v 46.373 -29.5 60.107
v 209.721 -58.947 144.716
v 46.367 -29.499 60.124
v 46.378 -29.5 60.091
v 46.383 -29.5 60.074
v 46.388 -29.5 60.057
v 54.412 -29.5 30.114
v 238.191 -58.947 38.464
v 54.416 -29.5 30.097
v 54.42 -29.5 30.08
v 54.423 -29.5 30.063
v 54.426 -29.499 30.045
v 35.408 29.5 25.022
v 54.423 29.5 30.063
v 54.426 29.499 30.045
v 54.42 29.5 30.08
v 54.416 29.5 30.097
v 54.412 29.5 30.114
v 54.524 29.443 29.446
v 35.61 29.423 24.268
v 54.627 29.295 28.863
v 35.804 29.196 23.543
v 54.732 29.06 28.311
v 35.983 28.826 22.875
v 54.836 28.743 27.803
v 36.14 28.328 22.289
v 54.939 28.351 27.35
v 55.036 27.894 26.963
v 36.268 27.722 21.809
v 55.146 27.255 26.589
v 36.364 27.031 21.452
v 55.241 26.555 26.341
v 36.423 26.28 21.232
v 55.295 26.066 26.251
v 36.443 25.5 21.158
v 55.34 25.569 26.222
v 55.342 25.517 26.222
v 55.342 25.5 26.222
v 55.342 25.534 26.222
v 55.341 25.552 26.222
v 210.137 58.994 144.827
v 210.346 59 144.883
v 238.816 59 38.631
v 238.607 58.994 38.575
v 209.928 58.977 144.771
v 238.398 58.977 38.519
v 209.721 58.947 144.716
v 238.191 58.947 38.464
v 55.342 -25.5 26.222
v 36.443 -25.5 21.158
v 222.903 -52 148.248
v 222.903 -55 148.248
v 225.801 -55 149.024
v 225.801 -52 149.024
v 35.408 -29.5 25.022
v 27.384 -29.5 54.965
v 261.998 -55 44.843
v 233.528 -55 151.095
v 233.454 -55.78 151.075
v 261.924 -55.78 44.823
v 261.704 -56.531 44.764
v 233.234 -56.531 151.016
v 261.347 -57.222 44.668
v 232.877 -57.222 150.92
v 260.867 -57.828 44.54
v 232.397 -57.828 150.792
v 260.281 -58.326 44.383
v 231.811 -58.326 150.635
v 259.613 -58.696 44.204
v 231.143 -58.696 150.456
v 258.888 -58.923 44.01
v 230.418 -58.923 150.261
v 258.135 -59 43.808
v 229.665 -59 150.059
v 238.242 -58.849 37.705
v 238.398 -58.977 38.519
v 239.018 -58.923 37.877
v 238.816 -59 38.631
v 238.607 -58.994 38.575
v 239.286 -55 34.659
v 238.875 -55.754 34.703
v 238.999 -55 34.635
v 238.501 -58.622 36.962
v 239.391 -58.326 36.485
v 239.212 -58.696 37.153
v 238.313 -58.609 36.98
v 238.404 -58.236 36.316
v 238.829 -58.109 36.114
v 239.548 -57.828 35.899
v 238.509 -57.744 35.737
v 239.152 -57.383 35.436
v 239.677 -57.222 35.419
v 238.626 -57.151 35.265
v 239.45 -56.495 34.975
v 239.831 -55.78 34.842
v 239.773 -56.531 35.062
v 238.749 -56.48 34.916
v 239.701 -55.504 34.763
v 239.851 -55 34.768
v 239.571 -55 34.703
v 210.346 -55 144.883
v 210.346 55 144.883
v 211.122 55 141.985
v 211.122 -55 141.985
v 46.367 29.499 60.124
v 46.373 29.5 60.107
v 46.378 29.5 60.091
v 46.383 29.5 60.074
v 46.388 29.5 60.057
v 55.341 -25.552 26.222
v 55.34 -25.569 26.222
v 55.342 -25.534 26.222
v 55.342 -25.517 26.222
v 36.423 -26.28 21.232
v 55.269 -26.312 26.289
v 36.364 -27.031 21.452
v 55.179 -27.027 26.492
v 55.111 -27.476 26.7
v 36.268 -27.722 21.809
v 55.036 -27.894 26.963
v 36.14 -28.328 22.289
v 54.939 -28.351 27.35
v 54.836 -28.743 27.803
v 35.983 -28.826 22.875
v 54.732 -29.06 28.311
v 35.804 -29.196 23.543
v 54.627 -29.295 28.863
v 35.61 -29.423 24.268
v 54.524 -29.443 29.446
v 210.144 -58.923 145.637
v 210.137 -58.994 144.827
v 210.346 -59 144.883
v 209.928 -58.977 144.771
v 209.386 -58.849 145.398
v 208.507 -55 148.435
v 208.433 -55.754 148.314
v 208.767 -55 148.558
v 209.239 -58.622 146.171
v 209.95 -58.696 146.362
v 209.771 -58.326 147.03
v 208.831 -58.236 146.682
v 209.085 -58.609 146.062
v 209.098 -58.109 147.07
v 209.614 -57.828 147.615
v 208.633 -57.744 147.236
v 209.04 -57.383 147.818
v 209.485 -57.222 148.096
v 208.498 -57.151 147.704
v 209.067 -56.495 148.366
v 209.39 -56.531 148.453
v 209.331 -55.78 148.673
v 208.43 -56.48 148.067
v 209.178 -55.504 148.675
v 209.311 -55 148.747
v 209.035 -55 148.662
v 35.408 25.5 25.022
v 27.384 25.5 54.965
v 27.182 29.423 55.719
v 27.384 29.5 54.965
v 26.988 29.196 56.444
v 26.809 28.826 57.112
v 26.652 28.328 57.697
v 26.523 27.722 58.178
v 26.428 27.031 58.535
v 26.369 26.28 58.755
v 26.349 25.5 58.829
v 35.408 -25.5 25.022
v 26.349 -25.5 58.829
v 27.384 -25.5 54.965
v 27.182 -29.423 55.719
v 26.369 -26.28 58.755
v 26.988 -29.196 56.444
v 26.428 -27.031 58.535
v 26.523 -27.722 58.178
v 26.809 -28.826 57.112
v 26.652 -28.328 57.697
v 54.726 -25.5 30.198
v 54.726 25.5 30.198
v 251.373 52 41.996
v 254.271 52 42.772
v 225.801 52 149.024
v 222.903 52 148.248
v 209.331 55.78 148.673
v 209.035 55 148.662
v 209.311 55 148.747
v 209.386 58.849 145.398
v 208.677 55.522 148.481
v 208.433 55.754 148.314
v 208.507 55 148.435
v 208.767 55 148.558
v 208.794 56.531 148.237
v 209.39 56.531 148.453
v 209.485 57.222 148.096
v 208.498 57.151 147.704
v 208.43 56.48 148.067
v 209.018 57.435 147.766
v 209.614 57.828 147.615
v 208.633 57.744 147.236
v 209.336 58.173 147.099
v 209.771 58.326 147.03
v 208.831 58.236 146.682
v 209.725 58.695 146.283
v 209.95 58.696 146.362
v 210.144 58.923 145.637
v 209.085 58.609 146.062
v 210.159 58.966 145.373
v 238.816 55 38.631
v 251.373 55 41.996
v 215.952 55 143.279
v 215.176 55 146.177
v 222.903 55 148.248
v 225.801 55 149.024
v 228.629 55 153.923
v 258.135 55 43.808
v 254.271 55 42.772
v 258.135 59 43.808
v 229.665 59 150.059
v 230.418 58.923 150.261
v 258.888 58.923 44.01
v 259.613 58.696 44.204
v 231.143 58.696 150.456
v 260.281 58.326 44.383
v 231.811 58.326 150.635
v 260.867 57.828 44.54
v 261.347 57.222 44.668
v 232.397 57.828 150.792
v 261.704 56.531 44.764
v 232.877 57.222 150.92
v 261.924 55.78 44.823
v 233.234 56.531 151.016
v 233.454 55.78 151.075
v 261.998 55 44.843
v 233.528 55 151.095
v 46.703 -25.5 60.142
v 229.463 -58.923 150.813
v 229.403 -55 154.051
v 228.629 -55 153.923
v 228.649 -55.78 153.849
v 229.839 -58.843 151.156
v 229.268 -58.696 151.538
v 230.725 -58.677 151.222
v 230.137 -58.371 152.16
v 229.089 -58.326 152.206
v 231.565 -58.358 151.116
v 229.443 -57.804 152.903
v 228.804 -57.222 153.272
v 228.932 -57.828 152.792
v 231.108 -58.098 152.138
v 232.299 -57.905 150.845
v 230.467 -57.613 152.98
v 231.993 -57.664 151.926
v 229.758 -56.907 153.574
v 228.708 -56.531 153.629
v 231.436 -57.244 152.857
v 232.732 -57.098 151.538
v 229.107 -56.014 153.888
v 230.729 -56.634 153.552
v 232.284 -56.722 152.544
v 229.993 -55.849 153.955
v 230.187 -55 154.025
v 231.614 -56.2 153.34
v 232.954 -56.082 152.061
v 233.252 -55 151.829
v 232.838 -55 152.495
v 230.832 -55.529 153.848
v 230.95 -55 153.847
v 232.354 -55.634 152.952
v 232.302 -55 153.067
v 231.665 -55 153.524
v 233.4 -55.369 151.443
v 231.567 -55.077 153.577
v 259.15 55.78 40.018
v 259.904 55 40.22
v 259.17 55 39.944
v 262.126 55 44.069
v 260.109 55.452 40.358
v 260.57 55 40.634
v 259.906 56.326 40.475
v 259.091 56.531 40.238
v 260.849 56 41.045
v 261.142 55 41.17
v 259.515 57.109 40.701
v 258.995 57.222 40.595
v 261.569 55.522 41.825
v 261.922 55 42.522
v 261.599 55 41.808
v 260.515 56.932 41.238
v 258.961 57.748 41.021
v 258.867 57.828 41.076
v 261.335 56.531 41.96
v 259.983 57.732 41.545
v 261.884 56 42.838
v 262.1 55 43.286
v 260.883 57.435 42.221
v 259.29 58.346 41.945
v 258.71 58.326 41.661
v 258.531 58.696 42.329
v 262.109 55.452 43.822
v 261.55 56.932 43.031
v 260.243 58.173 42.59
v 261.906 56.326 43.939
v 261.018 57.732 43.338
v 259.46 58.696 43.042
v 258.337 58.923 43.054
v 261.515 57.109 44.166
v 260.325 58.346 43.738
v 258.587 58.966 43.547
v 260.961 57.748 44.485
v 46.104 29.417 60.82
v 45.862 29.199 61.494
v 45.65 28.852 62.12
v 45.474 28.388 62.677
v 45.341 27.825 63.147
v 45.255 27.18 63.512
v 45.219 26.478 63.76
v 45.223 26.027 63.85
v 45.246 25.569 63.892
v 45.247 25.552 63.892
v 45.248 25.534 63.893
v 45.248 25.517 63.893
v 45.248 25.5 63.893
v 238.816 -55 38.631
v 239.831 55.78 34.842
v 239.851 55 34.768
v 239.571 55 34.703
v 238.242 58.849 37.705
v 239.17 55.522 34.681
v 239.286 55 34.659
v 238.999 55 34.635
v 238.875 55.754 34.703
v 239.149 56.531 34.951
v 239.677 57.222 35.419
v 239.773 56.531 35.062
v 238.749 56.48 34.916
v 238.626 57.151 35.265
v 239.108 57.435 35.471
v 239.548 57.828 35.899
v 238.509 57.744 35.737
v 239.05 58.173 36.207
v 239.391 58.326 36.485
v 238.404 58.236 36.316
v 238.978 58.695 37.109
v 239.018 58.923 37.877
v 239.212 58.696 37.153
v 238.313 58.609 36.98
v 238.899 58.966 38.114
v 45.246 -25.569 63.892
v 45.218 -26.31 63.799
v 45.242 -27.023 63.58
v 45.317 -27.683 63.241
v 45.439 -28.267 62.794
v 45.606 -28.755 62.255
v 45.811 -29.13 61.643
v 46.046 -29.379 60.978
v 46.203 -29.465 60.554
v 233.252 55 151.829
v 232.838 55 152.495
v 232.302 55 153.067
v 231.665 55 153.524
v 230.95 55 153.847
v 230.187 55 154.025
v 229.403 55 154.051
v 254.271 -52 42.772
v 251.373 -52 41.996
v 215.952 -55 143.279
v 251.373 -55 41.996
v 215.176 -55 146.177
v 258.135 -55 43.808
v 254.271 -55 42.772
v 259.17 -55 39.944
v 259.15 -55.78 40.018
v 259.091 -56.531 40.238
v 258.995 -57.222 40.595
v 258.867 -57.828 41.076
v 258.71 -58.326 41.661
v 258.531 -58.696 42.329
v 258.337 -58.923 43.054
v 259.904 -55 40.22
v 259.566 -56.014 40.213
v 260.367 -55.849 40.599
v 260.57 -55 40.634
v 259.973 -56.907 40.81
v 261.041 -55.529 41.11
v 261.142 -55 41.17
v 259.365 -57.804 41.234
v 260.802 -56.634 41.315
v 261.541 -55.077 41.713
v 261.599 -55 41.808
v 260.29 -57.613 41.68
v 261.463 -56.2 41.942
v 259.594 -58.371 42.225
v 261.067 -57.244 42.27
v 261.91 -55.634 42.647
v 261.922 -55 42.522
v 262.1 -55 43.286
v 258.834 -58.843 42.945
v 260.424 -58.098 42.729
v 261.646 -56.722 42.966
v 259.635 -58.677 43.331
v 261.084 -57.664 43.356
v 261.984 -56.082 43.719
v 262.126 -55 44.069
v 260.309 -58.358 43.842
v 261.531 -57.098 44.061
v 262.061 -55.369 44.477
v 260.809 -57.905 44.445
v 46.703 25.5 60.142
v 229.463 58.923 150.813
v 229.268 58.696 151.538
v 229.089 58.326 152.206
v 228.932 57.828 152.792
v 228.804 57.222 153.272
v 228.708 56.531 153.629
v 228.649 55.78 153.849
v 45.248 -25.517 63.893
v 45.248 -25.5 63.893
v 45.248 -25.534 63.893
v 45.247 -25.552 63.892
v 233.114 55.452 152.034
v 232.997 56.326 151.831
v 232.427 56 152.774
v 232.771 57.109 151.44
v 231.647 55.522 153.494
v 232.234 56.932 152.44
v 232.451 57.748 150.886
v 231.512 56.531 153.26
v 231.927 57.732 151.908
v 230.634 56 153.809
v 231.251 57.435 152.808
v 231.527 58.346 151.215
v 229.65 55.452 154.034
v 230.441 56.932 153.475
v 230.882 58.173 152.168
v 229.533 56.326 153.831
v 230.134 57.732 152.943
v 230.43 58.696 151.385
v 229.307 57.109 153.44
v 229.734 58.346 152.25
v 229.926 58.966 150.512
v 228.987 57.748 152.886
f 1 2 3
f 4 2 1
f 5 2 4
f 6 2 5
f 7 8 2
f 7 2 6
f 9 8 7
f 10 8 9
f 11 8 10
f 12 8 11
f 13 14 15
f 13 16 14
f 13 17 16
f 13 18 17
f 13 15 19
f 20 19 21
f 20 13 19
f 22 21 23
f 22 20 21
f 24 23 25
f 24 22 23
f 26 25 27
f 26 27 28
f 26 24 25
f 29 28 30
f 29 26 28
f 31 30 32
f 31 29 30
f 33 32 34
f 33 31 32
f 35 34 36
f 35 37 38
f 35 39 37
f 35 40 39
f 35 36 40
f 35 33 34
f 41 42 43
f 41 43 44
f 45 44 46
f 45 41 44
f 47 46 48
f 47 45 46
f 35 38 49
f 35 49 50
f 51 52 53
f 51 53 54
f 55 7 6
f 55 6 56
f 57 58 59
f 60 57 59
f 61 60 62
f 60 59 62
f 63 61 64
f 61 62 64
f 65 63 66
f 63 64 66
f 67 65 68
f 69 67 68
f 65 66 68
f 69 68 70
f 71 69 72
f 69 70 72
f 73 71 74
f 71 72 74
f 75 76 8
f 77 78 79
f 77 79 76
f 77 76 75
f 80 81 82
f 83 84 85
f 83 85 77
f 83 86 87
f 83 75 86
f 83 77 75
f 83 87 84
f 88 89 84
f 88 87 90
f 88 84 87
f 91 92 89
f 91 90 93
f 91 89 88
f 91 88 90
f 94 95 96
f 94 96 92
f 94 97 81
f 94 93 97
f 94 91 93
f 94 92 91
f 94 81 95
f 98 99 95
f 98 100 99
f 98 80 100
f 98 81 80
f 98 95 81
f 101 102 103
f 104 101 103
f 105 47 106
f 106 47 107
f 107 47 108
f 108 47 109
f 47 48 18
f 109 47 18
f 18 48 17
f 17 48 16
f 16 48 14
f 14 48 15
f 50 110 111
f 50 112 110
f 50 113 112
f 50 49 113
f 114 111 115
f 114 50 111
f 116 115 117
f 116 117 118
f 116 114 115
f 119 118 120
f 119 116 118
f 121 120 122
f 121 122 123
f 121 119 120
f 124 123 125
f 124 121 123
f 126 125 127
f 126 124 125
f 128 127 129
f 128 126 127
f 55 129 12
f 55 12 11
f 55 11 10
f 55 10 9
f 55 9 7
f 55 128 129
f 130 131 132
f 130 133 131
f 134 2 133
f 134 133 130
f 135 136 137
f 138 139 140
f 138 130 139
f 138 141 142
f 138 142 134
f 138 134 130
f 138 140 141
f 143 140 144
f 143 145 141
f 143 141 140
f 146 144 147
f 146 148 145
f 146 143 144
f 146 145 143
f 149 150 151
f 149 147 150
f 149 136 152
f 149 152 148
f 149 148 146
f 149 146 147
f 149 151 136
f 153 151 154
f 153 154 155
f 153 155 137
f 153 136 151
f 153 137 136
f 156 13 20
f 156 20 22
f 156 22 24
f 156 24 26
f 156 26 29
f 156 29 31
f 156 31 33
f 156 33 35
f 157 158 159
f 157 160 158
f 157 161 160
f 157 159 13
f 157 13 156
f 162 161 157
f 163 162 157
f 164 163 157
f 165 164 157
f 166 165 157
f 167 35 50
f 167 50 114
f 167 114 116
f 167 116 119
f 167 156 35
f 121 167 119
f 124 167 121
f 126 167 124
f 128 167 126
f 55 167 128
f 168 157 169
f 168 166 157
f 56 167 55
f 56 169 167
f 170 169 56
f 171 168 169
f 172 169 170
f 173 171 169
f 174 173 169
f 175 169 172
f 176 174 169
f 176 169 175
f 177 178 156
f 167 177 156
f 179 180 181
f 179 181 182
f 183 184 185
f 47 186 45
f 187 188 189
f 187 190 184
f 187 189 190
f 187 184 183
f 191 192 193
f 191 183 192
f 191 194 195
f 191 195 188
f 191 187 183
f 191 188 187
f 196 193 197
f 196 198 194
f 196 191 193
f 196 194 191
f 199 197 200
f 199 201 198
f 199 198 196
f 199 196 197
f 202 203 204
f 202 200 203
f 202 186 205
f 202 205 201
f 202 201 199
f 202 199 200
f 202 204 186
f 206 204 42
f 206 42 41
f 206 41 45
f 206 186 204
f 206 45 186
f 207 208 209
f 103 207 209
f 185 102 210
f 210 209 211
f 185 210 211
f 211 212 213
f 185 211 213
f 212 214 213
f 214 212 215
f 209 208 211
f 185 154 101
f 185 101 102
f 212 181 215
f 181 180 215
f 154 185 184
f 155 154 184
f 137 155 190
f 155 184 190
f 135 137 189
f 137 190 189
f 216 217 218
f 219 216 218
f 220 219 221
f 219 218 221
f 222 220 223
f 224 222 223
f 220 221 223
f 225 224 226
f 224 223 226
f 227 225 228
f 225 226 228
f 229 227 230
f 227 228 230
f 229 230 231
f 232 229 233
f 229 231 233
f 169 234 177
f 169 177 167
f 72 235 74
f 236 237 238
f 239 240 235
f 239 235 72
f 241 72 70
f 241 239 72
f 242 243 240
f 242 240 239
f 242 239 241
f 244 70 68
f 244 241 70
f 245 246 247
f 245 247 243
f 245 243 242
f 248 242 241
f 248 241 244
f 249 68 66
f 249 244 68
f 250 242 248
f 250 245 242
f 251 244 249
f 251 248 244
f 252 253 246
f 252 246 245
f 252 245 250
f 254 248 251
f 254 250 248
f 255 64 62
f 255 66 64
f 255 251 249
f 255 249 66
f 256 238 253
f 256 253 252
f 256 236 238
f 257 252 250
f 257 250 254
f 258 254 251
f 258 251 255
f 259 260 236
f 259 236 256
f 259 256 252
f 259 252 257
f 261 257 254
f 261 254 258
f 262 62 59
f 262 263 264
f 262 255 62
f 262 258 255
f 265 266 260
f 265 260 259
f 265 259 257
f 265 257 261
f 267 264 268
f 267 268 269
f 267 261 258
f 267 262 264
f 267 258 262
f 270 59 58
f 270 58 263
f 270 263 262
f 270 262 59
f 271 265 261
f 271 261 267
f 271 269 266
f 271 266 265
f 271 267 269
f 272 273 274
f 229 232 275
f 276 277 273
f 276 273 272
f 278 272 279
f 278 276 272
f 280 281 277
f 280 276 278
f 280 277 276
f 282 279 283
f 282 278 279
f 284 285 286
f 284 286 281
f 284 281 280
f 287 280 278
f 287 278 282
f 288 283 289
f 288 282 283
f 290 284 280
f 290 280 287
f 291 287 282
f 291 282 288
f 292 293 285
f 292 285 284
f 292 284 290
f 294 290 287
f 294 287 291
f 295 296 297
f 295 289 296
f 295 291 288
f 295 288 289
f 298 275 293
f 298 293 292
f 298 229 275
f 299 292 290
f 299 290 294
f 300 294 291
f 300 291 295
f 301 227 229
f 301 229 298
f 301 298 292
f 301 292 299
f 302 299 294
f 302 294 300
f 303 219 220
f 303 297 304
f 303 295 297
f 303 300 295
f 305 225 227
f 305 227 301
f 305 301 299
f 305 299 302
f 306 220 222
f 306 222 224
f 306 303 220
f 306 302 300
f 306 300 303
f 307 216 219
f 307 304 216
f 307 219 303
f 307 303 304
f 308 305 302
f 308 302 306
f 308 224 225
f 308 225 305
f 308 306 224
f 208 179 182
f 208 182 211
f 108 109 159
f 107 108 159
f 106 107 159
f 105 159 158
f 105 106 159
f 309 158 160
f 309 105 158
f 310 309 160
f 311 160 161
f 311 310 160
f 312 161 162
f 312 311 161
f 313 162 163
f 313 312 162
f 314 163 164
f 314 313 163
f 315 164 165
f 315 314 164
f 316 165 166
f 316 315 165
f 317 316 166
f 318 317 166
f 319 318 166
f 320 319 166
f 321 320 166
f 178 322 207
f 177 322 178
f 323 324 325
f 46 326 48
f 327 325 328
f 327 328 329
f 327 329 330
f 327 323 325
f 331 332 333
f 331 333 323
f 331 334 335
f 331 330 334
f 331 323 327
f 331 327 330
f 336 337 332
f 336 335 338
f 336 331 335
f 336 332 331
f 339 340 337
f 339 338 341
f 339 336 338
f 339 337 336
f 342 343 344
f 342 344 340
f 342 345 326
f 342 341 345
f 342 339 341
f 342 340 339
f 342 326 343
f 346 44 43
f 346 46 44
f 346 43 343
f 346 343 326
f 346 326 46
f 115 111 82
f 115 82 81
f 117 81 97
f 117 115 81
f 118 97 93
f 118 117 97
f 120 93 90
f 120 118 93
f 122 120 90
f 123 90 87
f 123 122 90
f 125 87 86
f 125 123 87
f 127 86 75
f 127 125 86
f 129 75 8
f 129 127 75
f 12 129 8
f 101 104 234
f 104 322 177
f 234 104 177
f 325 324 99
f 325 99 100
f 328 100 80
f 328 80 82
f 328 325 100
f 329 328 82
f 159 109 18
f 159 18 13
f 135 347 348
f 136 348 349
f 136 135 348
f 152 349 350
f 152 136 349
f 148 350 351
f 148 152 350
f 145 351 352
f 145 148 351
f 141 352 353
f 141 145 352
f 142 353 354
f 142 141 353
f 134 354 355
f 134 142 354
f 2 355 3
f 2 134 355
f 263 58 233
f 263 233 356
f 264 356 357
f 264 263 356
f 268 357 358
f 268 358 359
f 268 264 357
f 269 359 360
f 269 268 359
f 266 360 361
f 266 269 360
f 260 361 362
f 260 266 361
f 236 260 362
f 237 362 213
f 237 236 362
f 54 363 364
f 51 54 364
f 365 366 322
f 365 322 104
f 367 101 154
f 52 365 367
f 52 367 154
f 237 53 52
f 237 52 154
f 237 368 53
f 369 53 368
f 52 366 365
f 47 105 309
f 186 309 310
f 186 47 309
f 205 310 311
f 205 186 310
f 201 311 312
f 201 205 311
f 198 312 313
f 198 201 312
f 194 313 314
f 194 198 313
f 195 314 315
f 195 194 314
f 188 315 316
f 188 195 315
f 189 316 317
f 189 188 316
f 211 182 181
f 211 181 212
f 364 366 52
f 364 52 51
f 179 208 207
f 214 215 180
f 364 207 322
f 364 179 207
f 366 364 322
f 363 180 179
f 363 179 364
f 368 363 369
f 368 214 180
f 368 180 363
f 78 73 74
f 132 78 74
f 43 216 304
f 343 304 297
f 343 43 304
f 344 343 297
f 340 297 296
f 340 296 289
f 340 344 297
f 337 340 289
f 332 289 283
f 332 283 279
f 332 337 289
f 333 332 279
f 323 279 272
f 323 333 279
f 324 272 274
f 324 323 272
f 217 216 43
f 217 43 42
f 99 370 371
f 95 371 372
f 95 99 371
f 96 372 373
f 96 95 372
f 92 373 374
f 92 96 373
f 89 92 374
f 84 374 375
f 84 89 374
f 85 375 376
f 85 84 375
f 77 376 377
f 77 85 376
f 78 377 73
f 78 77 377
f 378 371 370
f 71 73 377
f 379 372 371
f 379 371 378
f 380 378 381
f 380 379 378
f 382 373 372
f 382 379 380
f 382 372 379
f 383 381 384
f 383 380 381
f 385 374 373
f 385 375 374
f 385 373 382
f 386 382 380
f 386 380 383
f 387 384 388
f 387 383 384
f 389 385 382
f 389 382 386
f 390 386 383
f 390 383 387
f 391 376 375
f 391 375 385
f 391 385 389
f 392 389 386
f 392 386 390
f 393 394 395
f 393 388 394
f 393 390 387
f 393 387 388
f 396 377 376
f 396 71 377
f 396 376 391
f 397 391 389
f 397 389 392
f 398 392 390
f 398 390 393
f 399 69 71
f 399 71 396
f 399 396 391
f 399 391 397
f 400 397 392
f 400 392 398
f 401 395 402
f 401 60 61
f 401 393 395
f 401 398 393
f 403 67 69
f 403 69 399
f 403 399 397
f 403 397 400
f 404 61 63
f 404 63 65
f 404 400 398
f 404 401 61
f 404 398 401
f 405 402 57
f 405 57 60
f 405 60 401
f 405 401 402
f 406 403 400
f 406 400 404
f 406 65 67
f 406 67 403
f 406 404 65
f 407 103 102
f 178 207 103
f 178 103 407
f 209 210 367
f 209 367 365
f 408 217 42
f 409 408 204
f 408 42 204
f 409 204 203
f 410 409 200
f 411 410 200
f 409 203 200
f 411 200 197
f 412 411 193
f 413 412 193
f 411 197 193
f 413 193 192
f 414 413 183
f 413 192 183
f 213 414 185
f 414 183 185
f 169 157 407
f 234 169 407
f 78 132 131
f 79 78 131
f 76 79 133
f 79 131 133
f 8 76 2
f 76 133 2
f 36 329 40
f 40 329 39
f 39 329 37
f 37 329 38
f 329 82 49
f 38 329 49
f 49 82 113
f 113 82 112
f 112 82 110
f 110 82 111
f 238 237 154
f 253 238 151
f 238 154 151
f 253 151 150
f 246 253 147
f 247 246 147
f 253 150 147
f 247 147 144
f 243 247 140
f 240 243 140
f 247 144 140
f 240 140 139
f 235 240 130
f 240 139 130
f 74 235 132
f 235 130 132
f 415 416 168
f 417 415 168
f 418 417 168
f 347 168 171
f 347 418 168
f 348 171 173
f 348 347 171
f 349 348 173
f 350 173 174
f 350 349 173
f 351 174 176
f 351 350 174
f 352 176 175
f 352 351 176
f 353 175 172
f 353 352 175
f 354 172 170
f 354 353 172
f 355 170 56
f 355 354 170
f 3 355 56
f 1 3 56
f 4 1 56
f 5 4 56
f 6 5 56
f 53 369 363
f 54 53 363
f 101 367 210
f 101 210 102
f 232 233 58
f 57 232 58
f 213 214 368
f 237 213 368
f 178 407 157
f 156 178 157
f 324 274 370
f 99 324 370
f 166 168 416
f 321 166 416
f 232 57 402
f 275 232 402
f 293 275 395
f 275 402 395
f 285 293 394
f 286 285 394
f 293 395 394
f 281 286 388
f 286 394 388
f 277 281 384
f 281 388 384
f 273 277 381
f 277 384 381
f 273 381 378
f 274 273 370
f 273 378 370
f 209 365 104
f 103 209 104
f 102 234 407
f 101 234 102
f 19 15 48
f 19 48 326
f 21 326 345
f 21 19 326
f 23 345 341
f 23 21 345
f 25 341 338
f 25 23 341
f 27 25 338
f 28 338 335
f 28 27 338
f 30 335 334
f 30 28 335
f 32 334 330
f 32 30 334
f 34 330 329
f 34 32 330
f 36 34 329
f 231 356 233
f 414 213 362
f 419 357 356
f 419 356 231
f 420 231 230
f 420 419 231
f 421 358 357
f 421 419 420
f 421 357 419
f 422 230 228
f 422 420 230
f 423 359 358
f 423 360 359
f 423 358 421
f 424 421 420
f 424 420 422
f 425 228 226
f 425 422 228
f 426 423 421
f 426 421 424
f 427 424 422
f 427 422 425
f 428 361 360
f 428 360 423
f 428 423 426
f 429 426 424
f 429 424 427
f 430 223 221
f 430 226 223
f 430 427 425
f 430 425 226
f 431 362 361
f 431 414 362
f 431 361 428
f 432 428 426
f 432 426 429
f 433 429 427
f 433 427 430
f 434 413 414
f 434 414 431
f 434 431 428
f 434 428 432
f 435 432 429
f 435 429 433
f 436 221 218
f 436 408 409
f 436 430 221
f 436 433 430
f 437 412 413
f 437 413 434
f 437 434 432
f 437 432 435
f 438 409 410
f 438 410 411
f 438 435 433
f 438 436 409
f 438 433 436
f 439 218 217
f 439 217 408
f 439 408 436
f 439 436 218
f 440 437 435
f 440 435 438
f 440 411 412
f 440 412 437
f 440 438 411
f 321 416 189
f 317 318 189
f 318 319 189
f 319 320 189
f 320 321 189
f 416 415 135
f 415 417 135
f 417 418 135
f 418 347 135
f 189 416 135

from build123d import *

# Parameters (mm, degrees)
SKETCH037_W             = 110
SKETCH037_H             = 110
PAD002_DEPTH            = 220
POCKET012_DEPTH         = 158
POCKET001_DEPTH         = 158
THICKNESS001_T          = 4
SKETCH014_W             = 110
SKETCH014_H             = 4
POCKET013_DEPTH         = 4
SKETCH016_W             = 3
SKETCH016_H             = 3
PAD022_DEPTH            = 110
SKETCH018_W             = 110
SKETCH018_H             = 16
POCKET014_DEPTH         = 4
SKETCH019_W             = 3
SKETCH019_H             = 5
PAD007_DEPTH            = 110
BODY007_ROLL_ANGLE      = 105
BODY007_PLACEMENT_ANGLE = -90


with BuildPart() as part:
    # Sketch037 → Pad002 (new body)
    with BuildSketch(Plane.XY):
        Rectangle(SKETCH037_W, SKETCH037_H)
    extrude(amount=PAD002_DEPTH)

    # Sketch038 (on Face3 of Pad002) → Pocket012 (cut)
    with BuildSketch(Plane.XZ.offset(55)):
        Polygon((-55, 20), (-25.5, 200), (-25.5, 220), (-55, 220), align=None)
        Polygon((25.5, 220), (55, 220), (55, 20), (25.5, 200), align=None)
    extrude(amount=-POCKET012_DEPTH, mode=Mode.SUBTRACT)

    # Sketch008 (on DatumPlane) → Pocket001 (cut)
    with BuildSketch(Plane.YZ.offset(55)):
        Polygon((-55, 20), (-15.5, 200), (-15.5, 220), (-55, 220), align=None)
        Polygon((15.5, 220), (15.5, 200), (55, 20), (55, 220), align=None)
    extrude(amount=-POCKET001_DEPTH, mode=Mode.SUBTRACT)

    # Thickness001
    thickness001_openings = [part.faces().sort_by_distance(p)[0] for p in [
        (0, 0, 220),
    ]]
    offset(amount=THICKNESS001_T, openings=thickness001_openings)

    # Sketch014 (on Face42 of Thickness001) → Pocket013 (cut)
    with BuildSketch(Plane(origin=(0, 59, 0), x_dir=(-1, 0, 0), z_dir=(0, 1, 0))):
        with Locations((0, 2)):
            Rectangle(SKETCH014_W, SKETCH014_H)
    extrude(amount=-POCKET013_DEPTH, mode=Mode.SUBTRACT)

    # Sketch016 (on Face35 of Pocket013) → Pad022 (join)
    with BuildSketch(Plane(origin=(0, -55, 0), x_dir=(-1, 0, 0), z_dir=(0, 1, 0))):
        with Locations((-53.5, 5.5)):
            Rectangle(SKETCH016_W, SKETCH016_H)
        with Locations((53.5, 5.5)):
            Rectangle(SKETCH016_W, SKETCH016_H)
    extrude(amount=PAD022_DEPTH)

    # Sketch018 (on Face36 of Pad022) → Pocket014 (cut)
    with BuildSketch(Plane(origin=(0, 59, 0), x_dir=(-1, 0, 0), z_dir=(0, 1, 0))):
        with Locations((0, 12)):
            Rectangle(SKETCH018_W, SKETCH018_H)
    extrude(amount=-POCKET014_DEPTH, mode=Mode.SUBTRACT)

    # Sketch019 (on Face49 of Pocket014) → Pad007 (join)
    with BuildSketch(Plane(origin=(55, 0, 0), x_dir=(0, -1, 0), z_dir=(-1, 0, 0))):
        with Locations((-53.5, 17.5)):
            Rectangle(SKETCH019_W, SKETCH019_H)
    extrude(amount=PAD007_DEPTH)


with BuildPart() as part_1:
    # Body007 roll: moved
    add(part.part.rotate(Axis((0, 0, 0), (1, 0, 0)), BODY007_ROLL_ANGLE))


with BuildPart() as part_2:
    # Body007 placement: moved
    add(part_1.part.moved(Location((243.899571, 0, 96.933558))).rotate(Axis((243.899571, 0, 96.933558), (0, 0, 1)), BODY007_PLACEMENT_ANGLE))


solid = part_2.part
